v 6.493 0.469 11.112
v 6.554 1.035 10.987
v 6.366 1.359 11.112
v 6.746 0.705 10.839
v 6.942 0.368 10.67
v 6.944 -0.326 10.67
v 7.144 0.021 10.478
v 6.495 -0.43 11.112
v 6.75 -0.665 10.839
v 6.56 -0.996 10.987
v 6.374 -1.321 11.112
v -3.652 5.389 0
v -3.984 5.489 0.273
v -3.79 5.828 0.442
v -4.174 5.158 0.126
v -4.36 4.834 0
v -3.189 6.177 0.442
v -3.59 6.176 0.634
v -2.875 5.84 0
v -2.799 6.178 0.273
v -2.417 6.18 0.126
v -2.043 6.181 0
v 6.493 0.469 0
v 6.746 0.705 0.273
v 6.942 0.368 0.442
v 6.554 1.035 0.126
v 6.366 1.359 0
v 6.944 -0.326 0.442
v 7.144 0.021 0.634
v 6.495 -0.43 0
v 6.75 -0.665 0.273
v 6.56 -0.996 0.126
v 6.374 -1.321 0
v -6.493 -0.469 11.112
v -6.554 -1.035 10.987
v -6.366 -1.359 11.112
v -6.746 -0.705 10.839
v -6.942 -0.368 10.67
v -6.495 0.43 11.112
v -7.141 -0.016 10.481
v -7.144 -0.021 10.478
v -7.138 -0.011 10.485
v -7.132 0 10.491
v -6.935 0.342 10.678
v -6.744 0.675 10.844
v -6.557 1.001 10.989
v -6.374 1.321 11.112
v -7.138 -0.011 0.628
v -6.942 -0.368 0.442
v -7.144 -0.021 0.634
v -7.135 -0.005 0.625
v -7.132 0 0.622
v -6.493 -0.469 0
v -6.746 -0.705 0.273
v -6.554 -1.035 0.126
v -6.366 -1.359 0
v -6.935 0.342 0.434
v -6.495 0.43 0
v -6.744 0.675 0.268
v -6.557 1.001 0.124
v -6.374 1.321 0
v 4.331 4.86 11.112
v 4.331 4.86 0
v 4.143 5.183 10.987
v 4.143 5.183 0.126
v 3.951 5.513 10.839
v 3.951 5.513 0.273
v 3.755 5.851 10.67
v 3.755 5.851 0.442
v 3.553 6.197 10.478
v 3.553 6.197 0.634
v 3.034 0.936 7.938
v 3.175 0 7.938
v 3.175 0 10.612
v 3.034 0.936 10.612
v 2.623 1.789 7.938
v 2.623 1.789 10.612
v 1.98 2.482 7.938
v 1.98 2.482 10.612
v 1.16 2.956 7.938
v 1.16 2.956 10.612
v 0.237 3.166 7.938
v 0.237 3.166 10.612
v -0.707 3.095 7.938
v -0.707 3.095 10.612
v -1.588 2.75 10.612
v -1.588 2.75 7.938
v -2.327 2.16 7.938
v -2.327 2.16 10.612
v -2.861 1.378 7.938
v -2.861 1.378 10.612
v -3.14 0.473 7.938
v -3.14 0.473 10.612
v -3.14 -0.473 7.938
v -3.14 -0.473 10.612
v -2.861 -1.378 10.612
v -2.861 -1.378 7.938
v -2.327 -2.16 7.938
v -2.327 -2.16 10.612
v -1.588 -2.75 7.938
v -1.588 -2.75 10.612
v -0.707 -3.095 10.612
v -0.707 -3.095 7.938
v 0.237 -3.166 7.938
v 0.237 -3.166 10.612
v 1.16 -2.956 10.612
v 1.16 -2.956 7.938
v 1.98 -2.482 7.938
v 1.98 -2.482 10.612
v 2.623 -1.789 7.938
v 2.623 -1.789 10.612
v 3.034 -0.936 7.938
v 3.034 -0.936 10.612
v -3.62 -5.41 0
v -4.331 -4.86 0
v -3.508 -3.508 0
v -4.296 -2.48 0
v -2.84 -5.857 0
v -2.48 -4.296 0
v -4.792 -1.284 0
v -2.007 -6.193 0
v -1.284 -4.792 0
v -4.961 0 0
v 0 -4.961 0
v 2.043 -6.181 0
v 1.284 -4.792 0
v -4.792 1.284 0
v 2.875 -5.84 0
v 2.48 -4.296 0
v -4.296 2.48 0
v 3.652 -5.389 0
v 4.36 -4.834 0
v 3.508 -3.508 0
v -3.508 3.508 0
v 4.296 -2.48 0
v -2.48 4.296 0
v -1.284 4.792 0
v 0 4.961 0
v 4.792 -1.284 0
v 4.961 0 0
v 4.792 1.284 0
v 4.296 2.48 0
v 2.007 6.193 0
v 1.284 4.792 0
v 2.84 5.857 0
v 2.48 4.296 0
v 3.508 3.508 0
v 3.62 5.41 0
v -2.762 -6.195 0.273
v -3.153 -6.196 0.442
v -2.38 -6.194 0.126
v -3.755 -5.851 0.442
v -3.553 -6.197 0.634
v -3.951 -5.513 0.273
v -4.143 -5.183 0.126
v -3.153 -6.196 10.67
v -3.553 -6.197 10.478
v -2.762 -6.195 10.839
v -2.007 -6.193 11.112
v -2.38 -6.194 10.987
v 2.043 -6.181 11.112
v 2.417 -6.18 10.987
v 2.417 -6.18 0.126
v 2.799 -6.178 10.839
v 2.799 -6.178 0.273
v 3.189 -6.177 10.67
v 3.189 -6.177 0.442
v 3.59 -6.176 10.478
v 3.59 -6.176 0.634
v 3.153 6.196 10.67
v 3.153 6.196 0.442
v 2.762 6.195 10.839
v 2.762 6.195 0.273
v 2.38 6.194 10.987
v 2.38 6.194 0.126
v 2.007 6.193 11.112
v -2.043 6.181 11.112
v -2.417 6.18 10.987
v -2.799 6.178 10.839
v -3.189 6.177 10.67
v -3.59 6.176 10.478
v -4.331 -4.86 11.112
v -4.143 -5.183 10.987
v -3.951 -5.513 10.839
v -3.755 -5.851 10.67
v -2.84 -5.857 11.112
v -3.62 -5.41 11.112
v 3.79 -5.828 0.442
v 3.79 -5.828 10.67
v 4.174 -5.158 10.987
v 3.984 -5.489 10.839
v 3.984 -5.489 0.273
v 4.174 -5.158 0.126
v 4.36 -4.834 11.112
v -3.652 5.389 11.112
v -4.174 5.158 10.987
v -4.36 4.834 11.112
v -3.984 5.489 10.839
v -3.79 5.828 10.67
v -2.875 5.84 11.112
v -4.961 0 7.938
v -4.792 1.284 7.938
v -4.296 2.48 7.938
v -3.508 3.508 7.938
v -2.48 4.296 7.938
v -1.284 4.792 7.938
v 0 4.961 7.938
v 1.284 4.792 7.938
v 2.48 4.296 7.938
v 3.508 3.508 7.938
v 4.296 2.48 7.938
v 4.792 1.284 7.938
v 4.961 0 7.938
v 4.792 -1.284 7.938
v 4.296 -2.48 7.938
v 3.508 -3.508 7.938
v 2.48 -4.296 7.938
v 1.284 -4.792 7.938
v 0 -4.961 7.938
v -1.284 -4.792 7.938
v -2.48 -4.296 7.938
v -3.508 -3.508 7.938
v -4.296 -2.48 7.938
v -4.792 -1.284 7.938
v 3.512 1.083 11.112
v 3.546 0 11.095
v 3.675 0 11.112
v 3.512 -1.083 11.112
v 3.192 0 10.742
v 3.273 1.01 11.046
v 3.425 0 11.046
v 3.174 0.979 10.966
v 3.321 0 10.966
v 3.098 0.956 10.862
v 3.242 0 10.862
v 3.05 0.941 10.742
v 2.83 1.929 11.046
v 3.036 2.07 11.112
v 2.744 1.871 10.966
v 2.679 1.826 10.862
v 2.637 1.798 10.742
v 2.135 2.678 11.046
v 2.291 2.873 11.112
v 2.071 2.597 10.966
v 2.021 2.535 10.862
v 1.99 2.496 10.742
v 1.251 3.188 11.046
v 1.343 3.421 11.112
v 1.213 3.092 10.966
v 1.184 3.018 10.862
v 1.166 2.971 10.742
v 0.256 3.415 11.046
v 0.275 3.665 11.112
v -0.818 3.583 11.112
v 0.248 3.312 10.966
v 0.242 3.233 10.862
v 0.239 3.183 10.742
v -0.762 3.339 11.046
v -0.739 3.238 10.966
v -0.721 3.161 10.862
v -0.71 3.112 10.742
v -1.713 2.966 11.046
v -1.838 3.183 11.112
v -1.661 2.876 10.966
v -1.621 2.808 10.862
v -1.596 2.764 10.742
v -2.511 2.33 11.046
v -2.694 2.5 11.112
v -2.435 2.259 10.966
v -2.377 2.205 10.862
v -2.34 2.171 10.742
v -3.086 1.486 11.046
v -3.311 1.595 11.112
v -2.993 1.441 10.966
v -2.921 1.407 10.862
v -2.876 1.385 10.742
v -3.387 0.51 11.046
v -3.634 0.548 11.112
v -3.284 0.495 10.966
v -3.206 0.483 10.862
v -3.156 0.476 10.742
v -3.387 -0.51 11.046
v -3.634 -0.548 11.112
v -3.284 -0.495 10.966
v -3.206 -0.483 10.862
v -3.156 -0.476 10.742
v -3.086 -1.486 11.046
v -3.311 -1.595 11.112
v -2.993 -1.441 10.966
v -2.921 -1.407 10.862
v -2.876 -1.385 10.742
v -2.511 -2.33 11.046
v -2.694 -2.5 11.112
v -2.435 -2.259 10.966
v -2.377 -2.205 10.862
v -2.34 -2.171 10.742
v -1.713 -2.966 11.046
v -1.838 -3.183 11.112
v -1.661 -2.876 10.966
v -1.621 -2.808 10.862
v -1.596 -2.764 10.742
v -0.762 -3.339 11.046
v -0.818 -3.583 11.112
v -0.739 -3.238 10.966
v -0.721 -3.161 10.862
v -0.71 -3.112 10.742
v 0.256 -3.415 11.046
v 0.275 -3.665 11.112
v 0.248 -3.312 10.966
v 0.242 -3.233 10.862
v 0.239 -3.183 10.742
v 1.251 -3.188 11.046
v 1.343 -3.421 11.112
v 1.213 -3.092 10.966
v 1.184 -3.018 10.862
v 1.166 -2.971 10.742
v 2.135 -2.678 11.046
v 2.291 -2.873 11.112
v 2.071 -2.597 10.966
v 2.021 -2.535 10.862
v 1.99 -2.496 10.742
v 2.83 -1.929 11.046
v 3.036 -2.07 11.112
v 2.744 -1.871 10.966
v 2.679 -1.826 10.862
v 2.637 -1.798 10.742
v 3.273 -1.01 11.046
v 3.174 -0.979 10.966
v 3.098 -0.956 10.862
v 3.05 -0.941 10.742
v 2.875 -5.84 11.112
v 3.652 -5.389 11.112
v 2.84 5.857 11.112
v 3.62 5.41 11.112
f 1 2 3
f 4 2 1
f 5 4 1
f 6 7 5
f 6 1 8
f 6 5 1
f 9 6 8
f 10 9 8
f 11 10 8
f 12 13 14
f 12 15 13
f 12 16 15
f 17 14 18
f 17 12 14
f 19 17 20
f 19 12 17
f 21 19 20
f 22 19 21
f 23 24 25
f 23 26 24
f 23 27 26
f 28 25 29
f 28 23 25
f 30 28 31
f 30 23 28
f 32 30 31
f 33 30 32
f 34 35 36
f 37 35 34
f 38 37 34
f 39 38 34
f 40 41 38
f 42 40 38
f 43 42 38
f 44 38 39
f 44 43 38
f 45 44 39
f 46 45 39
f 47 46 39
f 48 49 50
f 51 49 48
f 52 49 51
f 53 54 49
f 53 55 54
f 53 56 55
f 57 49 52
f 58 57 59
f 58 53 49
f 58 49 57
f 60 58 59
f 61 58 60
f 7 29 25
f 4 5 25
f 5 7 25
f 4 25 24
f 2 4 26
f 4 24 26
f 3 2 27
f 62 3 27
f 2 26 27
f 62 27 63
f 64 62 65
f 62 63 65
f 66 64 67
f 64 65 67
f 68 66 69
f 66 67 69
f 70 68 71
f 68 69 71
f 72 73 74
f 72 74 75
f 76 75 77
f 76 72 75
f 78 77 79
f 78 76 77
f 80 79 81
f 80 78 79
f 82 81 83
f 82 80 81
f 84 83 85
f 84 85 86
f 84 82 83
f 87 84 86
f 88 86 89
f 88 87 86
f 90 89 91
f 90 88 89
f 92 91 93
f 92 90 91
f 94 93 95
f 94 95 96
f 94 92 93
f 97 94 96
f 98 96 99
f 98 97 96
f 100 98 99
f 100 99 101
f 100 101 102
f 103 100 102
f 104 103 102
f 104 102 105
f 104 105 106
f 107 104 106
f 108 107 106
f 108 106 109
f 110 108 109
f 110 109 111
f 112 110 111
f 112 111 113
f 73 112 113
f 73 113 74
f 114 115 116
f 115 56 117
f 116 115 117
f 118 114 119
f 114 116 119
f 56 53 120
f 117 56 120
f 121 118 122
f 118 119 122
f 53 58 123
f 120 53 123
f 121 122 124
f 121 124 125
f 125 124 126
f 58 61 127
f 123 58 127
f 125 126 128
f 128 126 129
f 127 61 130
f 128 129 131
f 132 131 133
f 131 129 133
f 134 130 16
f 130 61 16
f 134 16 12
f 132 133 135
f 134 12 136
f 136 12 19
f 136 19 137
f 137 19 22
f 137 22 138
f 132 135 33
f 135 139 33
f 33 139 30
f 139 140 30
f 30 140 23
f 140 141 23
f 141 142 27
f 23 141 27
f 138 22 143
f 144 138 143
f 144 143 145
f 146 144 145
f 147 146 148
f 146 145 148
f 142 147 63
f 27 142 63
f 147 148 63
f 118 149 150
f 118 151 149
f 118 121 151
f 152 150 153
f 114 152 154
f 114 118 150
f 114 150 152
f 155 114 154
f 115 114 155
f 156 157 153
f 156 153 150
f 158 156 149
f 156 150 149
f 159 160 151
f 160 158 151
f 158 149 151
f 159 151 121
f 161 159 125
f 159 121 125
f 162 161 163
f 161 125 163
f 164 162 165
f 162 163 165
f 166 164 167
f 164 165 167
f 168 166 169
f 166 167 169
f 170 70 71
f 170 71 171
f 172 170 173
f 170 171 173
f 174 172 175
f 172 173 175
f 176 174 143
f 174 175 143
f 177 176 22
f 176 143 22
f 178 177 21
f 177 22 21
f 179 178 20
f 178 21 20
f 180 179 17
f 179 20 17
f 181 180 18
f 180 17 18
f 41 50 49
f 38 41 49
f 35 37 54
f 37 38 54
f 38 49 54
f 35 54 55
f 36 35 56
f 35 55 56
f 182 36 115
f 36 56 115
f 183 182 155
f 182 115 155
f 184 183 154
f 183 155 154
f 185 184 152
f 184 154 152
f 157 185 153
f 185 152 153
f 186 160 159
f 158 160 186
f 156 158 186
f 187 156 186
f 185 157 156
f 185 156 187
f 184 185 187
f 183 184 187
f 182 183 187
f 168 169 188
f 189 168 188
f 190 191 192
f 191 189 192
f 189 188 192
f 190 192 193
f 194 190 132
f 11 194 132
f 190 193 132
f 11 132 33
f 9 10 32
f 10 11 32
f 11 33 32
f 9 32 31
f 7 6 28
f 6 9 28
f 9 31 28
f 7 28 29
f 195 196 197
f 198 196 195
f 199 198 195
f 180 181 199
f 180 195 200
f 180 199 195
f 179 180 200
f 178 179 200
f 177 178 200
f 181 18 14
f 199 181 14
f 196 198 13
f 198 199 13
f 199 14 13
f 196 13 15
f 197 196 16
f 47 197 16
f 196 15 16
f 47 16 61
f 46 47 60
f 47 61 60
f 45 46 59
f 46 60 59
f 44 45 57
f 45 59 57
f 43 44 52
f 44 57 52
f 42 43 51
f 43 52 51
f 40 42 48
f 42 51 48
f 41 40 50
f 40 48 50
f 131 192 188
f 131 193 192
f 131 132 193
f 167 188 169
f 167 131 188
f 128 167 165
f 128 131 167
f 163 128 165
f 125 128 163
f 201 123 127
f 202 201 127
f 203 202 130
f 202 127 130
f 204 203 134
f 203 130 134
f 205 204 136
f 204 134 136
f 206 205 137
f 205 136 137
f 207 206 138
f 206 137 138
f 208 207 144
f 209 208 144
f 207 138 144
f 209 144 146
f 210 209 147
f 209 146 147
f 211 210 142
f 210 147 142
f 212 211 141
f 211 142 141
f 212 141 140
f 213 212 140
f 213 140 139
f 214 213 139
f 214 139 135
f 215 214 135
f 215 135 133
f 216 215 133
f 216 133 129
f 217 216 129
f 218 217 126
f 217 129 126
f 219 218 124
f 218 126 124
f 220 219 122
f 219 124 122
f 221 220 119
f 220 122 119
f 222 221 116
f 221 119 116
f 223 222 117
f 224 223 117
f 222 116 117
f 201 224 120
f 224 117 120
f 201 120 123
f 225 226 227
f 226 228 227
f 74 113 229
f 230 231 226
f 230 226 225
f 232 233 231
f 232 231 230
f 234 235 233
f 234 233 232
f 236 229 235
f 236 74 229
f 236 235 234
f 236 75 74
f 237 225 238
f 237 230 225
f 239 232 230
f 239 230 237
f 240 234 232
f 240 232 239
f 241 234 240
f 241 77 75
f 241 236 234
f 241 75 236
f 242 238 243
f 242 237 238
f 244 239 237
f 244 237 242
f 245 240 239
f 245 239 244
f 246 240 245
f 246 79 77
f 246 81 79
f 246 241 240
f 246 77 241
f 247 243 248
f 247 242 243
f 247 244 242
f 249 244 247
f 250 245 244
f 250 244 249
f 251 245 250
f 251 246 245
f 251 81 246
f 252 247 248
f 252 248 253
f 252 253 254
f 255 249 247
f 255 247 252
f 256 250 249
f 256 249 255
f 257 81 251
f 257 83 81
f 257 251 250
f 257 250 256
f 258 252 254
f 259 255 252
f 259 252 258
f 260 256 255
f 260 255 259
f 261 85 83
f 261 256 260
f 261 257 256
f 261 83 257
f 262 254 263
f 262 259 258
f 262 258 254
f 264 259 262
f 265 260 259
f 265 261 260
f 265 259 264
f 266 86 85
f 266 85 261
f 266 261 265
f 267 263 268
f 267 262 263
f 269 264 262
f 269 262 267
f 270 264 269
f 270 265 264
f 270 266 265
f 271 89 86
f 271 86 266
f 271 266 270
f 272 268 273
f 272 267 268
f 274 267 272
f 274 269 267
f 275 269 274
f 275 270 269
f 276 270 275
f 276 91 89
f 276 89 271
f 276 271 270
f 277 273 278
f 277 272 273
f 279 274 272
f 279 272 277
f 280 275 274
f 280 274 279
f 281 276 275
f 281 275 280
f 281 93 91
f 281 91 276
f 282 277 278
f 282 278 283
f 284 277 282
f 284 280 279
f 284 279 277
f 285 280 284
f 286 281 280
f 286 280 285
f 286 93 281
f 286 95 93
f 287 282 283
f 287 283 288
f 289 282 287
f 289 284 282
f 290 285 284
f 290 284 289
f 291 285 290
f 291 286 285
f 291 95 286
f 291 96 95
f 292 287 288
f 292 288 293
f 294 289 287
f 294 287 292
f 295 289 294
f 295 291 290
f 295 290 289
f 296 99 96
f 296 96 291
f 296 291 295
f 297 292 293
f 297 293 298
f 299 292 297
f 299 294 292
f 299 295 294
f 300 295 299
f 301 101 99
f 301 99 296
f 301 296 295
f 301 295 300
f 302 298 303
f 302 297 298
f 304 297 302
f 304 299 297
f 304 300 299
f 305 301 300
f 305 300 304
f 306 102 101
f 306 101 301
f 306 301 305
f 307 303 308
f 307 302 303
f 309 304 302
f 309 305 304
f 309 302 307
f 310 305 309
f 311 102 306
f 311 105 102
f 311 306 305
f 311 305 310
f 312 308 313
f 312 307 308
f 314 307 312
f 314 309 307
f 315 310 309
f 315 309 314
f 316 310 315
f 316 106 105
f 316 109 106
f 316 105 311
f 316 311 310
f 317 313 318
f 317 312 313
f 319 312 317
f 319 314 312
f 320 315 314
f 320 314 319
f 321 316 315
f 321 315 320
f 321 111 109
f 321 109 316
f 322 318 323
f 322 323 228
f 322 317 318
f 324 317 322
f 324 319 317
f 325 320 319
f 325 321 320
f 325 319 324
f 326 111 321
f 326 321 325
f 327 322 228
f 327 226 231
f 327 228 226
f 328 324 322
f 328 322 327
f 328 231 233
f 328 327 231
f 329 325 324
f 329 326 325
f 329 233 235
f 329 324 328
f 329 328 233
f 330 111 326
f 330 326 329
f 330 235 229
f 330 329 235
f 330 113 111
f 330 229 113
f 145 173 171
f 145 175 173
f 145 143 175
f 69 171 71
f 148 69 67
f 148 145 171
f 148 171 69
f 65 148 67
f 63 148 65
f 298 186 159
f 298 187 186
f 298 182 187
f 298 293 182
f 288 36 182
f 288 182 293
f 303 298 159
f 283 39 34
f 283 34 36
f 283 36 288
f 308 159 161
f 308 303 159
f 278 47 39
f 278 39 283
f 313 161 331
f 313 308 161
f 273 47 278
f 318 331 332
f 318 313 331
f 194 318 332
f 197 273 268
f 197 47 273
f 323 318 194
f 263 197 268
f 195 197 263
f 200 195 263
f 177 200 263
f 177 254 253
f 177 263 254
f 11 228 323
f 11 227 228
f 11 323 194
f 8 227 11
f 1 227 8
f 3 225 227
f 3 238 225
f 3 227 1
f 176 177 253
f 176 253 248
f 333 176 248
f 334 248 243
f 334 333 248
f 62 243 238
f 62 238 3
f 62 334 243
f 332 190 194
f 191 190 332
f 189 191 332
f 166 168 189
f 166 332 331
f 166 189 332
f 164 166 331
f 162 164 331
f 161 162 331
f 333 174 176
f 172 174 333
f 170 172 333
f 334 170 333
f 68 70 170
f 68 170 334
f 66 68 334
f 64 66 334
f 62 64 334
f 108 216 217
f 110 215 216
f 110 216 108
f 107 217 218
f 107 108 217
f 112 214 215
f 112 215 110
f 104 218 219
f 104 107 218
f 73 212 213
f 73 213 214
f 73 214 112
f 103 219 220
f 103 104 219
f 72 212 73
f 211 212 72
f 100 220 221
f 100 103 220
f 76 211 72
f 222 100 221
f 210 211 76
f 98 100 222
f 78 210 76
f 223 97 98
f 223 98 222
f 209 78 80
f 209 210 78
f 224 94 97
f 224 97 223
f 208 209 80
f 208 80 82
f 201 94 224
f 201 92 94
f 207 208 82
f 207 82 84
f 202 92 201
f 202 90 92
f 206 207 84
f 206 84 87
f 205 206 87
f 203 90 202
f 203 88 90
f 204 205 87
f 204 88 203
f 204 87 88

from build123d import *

# Parameters (mm, degrees)
ESBO_O1_R                = 3.175
RESSALTO_EXTRUS_O1_DEPTH = 11.1125
ESBO_O2_R                = 4.9609375
CORTE_EXTRUS_O1_DEPTH    = 7.9375
FILETE1_R                = 0.5


with BuildPart() as part:
    # Esboço1 → Ressalto-extrusão1 (new body)
    with BuildSketch(Plane.XY):
        Polygon((3.553451716, 6.197269154), (-3.590266663, 6.176014034), (-7.143718379, -0.021255119), (-3.553451716, -6.197269154), (3.590266663, -6.176014034), (7.143718379, 0.021255119), align=None)
        Circle(ESBO_O1_R, mode=Mode.SUBTRACT)
    extrude(amount=RESSALTO_EXTRUS_O1_DEPTH)

    # Esboço2 → Corte-extrusão1 (cut)
    with BuildSketch(Plane(origin=(0, 0, 0), x_dir=(-1, 0, 0), z_dir=(0, 0, -1))):
        Circle(ESBO_O2_R)
    extrude(amount=-CORTE_EXTRUS_O1_DEPTH, mode=Mode.SUBTRACT)

    # Filete1
    filete1_edges = [part.edges().sort_by_distance(p)[0] for p in [
        (-3.175, 0, 11.1125),
    ]]
    fillet(filete1_edges, radius=FILETE1_R)

    # Esboço4 → Corte-Revolução4 (revolve, cut)
    with BuildSketch(Plane(origin=(0, 0, 0), x_dir=(1, 0, 0), z_dir=(0, 1, 0)), mode=Mode.PRIVATE) as corte_revolu_o4_sk:
        Polygon((6.409669222, -16.266104521), (6.409669222, -11.2125), (9.269615278, -8.352553944), (9.269615278, -16.266104521), align=None)
        Polygon((6.409669222, 5.153604521), (9.269615278, 5.153604521), (9.269615278, -2.759946056), (6.409669222, 0.1), align=None)
    revolve(corte_revolu_o4_sk.sketch.rotate(Axis((0, 0, 23.395635865), (0, 0, -1)), 180), axis=Axis((0, 0, 23.395635865), (0, 0, -1)), mode=Mode.SUBTRACT)


solid = part.part
